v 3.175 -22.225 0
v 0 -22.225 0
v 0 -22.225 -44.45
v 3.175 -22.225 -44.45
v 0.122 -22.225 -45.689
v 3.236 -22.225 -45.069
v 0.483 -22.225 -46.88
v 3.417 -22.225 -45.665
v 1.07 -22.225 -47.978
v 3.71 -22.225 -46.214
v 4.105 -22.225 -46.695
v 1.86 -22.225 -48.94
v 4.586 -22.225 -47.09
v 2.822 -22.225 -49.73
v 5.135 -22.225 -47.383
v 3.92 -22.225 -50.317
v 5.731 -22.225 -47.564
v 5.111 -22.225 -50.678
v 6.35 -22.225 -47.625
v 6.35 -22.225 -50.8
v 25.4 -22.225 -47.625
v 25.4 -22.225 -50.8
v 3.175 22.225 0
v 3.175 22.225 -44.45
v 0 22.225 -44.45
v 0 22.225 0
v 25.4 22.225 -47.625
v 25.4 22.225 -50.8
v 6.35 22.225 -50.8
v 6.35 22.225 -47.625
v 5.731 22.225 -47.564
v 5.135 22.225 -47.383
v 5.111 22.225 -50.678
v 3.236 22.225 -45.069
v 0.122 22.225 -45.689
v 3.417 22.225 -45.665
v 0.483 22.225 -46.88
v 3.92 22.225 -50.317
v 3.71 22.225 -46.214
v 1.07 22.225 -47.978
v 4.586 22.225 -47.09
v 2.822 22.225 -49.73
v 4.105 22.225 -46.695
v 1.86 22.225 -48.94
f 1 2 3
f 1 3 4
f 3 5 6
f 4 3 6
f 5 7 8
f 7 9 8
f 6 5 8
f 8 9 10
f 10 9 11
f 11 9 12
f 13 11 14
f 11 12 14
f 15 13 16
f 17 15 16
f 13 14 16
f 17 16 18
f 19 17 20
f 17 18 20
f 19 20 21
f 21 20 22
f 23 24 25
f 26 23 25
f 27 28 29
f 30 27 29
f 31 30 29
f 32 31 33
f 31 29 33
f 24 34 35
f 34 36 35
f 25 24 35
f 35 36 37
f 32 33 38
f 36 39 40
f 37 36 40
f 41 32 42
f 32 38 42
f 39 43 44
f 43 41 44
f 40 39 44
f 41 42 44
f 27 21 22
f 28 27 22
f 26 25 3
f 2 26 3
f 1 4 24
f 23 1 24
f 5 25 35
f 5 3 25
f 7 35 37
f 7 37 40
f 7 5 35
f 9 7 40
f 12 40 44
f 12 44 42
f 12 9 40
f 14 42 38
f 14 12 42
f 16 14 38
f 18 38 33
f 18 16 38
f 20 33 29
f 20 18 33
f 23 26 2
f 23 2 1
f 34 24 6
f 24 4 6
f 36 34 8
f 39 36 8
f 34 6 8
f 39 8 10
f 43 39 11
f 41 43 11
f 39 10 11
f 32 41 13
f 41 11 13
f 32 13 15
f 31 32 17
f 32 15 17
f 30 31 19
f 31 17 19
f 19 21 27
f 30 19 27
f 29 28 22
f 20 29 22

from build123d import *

# Parameters (mm, degrees)
SKETCH3_W = 3.175
SKETCH3_H = 44.45
FILLET1_R = 3.175
FILLET2_R = 6.35


with BuildPart() as part:
    # Sweep1: sweep along a path in Sketch4
    with BuildLine(Plane(origin=(0, 0, 0), x_dir=(1, 0, 0), z_dir=(0, 1, 0))) as sweep1_path:
        Line((0, 0), (0, 50.8))
        Line((0, 50.8), (25.4, 50.8))
    # Sketch3 → Sweep1 (sweep)
    with BuildSketch(Plane.XY):
        with Locations((1.5875, 0)):
            Rectangle(SKETCH3_W, SKETCH3_H)
    sweep(path=sweep1_path.line, transition=Transition.RIGHT)

    # Fillet1
    fillet1_edges = [part.edges().sort_by_distance(p)[0] for p in [
        (3.175, 0, -47.625),
    ]]
    fillet(fillet1_edges, radius=FILLET1_R)

    # Fillet2
    fillet2_edges = [part.edges().sort_by_distance(p)[0] for p in [
        (0, 0, -50.8),
    ]]
    fillet(fillet2_edges, radius=FILLET2_R)


solid = part.part
